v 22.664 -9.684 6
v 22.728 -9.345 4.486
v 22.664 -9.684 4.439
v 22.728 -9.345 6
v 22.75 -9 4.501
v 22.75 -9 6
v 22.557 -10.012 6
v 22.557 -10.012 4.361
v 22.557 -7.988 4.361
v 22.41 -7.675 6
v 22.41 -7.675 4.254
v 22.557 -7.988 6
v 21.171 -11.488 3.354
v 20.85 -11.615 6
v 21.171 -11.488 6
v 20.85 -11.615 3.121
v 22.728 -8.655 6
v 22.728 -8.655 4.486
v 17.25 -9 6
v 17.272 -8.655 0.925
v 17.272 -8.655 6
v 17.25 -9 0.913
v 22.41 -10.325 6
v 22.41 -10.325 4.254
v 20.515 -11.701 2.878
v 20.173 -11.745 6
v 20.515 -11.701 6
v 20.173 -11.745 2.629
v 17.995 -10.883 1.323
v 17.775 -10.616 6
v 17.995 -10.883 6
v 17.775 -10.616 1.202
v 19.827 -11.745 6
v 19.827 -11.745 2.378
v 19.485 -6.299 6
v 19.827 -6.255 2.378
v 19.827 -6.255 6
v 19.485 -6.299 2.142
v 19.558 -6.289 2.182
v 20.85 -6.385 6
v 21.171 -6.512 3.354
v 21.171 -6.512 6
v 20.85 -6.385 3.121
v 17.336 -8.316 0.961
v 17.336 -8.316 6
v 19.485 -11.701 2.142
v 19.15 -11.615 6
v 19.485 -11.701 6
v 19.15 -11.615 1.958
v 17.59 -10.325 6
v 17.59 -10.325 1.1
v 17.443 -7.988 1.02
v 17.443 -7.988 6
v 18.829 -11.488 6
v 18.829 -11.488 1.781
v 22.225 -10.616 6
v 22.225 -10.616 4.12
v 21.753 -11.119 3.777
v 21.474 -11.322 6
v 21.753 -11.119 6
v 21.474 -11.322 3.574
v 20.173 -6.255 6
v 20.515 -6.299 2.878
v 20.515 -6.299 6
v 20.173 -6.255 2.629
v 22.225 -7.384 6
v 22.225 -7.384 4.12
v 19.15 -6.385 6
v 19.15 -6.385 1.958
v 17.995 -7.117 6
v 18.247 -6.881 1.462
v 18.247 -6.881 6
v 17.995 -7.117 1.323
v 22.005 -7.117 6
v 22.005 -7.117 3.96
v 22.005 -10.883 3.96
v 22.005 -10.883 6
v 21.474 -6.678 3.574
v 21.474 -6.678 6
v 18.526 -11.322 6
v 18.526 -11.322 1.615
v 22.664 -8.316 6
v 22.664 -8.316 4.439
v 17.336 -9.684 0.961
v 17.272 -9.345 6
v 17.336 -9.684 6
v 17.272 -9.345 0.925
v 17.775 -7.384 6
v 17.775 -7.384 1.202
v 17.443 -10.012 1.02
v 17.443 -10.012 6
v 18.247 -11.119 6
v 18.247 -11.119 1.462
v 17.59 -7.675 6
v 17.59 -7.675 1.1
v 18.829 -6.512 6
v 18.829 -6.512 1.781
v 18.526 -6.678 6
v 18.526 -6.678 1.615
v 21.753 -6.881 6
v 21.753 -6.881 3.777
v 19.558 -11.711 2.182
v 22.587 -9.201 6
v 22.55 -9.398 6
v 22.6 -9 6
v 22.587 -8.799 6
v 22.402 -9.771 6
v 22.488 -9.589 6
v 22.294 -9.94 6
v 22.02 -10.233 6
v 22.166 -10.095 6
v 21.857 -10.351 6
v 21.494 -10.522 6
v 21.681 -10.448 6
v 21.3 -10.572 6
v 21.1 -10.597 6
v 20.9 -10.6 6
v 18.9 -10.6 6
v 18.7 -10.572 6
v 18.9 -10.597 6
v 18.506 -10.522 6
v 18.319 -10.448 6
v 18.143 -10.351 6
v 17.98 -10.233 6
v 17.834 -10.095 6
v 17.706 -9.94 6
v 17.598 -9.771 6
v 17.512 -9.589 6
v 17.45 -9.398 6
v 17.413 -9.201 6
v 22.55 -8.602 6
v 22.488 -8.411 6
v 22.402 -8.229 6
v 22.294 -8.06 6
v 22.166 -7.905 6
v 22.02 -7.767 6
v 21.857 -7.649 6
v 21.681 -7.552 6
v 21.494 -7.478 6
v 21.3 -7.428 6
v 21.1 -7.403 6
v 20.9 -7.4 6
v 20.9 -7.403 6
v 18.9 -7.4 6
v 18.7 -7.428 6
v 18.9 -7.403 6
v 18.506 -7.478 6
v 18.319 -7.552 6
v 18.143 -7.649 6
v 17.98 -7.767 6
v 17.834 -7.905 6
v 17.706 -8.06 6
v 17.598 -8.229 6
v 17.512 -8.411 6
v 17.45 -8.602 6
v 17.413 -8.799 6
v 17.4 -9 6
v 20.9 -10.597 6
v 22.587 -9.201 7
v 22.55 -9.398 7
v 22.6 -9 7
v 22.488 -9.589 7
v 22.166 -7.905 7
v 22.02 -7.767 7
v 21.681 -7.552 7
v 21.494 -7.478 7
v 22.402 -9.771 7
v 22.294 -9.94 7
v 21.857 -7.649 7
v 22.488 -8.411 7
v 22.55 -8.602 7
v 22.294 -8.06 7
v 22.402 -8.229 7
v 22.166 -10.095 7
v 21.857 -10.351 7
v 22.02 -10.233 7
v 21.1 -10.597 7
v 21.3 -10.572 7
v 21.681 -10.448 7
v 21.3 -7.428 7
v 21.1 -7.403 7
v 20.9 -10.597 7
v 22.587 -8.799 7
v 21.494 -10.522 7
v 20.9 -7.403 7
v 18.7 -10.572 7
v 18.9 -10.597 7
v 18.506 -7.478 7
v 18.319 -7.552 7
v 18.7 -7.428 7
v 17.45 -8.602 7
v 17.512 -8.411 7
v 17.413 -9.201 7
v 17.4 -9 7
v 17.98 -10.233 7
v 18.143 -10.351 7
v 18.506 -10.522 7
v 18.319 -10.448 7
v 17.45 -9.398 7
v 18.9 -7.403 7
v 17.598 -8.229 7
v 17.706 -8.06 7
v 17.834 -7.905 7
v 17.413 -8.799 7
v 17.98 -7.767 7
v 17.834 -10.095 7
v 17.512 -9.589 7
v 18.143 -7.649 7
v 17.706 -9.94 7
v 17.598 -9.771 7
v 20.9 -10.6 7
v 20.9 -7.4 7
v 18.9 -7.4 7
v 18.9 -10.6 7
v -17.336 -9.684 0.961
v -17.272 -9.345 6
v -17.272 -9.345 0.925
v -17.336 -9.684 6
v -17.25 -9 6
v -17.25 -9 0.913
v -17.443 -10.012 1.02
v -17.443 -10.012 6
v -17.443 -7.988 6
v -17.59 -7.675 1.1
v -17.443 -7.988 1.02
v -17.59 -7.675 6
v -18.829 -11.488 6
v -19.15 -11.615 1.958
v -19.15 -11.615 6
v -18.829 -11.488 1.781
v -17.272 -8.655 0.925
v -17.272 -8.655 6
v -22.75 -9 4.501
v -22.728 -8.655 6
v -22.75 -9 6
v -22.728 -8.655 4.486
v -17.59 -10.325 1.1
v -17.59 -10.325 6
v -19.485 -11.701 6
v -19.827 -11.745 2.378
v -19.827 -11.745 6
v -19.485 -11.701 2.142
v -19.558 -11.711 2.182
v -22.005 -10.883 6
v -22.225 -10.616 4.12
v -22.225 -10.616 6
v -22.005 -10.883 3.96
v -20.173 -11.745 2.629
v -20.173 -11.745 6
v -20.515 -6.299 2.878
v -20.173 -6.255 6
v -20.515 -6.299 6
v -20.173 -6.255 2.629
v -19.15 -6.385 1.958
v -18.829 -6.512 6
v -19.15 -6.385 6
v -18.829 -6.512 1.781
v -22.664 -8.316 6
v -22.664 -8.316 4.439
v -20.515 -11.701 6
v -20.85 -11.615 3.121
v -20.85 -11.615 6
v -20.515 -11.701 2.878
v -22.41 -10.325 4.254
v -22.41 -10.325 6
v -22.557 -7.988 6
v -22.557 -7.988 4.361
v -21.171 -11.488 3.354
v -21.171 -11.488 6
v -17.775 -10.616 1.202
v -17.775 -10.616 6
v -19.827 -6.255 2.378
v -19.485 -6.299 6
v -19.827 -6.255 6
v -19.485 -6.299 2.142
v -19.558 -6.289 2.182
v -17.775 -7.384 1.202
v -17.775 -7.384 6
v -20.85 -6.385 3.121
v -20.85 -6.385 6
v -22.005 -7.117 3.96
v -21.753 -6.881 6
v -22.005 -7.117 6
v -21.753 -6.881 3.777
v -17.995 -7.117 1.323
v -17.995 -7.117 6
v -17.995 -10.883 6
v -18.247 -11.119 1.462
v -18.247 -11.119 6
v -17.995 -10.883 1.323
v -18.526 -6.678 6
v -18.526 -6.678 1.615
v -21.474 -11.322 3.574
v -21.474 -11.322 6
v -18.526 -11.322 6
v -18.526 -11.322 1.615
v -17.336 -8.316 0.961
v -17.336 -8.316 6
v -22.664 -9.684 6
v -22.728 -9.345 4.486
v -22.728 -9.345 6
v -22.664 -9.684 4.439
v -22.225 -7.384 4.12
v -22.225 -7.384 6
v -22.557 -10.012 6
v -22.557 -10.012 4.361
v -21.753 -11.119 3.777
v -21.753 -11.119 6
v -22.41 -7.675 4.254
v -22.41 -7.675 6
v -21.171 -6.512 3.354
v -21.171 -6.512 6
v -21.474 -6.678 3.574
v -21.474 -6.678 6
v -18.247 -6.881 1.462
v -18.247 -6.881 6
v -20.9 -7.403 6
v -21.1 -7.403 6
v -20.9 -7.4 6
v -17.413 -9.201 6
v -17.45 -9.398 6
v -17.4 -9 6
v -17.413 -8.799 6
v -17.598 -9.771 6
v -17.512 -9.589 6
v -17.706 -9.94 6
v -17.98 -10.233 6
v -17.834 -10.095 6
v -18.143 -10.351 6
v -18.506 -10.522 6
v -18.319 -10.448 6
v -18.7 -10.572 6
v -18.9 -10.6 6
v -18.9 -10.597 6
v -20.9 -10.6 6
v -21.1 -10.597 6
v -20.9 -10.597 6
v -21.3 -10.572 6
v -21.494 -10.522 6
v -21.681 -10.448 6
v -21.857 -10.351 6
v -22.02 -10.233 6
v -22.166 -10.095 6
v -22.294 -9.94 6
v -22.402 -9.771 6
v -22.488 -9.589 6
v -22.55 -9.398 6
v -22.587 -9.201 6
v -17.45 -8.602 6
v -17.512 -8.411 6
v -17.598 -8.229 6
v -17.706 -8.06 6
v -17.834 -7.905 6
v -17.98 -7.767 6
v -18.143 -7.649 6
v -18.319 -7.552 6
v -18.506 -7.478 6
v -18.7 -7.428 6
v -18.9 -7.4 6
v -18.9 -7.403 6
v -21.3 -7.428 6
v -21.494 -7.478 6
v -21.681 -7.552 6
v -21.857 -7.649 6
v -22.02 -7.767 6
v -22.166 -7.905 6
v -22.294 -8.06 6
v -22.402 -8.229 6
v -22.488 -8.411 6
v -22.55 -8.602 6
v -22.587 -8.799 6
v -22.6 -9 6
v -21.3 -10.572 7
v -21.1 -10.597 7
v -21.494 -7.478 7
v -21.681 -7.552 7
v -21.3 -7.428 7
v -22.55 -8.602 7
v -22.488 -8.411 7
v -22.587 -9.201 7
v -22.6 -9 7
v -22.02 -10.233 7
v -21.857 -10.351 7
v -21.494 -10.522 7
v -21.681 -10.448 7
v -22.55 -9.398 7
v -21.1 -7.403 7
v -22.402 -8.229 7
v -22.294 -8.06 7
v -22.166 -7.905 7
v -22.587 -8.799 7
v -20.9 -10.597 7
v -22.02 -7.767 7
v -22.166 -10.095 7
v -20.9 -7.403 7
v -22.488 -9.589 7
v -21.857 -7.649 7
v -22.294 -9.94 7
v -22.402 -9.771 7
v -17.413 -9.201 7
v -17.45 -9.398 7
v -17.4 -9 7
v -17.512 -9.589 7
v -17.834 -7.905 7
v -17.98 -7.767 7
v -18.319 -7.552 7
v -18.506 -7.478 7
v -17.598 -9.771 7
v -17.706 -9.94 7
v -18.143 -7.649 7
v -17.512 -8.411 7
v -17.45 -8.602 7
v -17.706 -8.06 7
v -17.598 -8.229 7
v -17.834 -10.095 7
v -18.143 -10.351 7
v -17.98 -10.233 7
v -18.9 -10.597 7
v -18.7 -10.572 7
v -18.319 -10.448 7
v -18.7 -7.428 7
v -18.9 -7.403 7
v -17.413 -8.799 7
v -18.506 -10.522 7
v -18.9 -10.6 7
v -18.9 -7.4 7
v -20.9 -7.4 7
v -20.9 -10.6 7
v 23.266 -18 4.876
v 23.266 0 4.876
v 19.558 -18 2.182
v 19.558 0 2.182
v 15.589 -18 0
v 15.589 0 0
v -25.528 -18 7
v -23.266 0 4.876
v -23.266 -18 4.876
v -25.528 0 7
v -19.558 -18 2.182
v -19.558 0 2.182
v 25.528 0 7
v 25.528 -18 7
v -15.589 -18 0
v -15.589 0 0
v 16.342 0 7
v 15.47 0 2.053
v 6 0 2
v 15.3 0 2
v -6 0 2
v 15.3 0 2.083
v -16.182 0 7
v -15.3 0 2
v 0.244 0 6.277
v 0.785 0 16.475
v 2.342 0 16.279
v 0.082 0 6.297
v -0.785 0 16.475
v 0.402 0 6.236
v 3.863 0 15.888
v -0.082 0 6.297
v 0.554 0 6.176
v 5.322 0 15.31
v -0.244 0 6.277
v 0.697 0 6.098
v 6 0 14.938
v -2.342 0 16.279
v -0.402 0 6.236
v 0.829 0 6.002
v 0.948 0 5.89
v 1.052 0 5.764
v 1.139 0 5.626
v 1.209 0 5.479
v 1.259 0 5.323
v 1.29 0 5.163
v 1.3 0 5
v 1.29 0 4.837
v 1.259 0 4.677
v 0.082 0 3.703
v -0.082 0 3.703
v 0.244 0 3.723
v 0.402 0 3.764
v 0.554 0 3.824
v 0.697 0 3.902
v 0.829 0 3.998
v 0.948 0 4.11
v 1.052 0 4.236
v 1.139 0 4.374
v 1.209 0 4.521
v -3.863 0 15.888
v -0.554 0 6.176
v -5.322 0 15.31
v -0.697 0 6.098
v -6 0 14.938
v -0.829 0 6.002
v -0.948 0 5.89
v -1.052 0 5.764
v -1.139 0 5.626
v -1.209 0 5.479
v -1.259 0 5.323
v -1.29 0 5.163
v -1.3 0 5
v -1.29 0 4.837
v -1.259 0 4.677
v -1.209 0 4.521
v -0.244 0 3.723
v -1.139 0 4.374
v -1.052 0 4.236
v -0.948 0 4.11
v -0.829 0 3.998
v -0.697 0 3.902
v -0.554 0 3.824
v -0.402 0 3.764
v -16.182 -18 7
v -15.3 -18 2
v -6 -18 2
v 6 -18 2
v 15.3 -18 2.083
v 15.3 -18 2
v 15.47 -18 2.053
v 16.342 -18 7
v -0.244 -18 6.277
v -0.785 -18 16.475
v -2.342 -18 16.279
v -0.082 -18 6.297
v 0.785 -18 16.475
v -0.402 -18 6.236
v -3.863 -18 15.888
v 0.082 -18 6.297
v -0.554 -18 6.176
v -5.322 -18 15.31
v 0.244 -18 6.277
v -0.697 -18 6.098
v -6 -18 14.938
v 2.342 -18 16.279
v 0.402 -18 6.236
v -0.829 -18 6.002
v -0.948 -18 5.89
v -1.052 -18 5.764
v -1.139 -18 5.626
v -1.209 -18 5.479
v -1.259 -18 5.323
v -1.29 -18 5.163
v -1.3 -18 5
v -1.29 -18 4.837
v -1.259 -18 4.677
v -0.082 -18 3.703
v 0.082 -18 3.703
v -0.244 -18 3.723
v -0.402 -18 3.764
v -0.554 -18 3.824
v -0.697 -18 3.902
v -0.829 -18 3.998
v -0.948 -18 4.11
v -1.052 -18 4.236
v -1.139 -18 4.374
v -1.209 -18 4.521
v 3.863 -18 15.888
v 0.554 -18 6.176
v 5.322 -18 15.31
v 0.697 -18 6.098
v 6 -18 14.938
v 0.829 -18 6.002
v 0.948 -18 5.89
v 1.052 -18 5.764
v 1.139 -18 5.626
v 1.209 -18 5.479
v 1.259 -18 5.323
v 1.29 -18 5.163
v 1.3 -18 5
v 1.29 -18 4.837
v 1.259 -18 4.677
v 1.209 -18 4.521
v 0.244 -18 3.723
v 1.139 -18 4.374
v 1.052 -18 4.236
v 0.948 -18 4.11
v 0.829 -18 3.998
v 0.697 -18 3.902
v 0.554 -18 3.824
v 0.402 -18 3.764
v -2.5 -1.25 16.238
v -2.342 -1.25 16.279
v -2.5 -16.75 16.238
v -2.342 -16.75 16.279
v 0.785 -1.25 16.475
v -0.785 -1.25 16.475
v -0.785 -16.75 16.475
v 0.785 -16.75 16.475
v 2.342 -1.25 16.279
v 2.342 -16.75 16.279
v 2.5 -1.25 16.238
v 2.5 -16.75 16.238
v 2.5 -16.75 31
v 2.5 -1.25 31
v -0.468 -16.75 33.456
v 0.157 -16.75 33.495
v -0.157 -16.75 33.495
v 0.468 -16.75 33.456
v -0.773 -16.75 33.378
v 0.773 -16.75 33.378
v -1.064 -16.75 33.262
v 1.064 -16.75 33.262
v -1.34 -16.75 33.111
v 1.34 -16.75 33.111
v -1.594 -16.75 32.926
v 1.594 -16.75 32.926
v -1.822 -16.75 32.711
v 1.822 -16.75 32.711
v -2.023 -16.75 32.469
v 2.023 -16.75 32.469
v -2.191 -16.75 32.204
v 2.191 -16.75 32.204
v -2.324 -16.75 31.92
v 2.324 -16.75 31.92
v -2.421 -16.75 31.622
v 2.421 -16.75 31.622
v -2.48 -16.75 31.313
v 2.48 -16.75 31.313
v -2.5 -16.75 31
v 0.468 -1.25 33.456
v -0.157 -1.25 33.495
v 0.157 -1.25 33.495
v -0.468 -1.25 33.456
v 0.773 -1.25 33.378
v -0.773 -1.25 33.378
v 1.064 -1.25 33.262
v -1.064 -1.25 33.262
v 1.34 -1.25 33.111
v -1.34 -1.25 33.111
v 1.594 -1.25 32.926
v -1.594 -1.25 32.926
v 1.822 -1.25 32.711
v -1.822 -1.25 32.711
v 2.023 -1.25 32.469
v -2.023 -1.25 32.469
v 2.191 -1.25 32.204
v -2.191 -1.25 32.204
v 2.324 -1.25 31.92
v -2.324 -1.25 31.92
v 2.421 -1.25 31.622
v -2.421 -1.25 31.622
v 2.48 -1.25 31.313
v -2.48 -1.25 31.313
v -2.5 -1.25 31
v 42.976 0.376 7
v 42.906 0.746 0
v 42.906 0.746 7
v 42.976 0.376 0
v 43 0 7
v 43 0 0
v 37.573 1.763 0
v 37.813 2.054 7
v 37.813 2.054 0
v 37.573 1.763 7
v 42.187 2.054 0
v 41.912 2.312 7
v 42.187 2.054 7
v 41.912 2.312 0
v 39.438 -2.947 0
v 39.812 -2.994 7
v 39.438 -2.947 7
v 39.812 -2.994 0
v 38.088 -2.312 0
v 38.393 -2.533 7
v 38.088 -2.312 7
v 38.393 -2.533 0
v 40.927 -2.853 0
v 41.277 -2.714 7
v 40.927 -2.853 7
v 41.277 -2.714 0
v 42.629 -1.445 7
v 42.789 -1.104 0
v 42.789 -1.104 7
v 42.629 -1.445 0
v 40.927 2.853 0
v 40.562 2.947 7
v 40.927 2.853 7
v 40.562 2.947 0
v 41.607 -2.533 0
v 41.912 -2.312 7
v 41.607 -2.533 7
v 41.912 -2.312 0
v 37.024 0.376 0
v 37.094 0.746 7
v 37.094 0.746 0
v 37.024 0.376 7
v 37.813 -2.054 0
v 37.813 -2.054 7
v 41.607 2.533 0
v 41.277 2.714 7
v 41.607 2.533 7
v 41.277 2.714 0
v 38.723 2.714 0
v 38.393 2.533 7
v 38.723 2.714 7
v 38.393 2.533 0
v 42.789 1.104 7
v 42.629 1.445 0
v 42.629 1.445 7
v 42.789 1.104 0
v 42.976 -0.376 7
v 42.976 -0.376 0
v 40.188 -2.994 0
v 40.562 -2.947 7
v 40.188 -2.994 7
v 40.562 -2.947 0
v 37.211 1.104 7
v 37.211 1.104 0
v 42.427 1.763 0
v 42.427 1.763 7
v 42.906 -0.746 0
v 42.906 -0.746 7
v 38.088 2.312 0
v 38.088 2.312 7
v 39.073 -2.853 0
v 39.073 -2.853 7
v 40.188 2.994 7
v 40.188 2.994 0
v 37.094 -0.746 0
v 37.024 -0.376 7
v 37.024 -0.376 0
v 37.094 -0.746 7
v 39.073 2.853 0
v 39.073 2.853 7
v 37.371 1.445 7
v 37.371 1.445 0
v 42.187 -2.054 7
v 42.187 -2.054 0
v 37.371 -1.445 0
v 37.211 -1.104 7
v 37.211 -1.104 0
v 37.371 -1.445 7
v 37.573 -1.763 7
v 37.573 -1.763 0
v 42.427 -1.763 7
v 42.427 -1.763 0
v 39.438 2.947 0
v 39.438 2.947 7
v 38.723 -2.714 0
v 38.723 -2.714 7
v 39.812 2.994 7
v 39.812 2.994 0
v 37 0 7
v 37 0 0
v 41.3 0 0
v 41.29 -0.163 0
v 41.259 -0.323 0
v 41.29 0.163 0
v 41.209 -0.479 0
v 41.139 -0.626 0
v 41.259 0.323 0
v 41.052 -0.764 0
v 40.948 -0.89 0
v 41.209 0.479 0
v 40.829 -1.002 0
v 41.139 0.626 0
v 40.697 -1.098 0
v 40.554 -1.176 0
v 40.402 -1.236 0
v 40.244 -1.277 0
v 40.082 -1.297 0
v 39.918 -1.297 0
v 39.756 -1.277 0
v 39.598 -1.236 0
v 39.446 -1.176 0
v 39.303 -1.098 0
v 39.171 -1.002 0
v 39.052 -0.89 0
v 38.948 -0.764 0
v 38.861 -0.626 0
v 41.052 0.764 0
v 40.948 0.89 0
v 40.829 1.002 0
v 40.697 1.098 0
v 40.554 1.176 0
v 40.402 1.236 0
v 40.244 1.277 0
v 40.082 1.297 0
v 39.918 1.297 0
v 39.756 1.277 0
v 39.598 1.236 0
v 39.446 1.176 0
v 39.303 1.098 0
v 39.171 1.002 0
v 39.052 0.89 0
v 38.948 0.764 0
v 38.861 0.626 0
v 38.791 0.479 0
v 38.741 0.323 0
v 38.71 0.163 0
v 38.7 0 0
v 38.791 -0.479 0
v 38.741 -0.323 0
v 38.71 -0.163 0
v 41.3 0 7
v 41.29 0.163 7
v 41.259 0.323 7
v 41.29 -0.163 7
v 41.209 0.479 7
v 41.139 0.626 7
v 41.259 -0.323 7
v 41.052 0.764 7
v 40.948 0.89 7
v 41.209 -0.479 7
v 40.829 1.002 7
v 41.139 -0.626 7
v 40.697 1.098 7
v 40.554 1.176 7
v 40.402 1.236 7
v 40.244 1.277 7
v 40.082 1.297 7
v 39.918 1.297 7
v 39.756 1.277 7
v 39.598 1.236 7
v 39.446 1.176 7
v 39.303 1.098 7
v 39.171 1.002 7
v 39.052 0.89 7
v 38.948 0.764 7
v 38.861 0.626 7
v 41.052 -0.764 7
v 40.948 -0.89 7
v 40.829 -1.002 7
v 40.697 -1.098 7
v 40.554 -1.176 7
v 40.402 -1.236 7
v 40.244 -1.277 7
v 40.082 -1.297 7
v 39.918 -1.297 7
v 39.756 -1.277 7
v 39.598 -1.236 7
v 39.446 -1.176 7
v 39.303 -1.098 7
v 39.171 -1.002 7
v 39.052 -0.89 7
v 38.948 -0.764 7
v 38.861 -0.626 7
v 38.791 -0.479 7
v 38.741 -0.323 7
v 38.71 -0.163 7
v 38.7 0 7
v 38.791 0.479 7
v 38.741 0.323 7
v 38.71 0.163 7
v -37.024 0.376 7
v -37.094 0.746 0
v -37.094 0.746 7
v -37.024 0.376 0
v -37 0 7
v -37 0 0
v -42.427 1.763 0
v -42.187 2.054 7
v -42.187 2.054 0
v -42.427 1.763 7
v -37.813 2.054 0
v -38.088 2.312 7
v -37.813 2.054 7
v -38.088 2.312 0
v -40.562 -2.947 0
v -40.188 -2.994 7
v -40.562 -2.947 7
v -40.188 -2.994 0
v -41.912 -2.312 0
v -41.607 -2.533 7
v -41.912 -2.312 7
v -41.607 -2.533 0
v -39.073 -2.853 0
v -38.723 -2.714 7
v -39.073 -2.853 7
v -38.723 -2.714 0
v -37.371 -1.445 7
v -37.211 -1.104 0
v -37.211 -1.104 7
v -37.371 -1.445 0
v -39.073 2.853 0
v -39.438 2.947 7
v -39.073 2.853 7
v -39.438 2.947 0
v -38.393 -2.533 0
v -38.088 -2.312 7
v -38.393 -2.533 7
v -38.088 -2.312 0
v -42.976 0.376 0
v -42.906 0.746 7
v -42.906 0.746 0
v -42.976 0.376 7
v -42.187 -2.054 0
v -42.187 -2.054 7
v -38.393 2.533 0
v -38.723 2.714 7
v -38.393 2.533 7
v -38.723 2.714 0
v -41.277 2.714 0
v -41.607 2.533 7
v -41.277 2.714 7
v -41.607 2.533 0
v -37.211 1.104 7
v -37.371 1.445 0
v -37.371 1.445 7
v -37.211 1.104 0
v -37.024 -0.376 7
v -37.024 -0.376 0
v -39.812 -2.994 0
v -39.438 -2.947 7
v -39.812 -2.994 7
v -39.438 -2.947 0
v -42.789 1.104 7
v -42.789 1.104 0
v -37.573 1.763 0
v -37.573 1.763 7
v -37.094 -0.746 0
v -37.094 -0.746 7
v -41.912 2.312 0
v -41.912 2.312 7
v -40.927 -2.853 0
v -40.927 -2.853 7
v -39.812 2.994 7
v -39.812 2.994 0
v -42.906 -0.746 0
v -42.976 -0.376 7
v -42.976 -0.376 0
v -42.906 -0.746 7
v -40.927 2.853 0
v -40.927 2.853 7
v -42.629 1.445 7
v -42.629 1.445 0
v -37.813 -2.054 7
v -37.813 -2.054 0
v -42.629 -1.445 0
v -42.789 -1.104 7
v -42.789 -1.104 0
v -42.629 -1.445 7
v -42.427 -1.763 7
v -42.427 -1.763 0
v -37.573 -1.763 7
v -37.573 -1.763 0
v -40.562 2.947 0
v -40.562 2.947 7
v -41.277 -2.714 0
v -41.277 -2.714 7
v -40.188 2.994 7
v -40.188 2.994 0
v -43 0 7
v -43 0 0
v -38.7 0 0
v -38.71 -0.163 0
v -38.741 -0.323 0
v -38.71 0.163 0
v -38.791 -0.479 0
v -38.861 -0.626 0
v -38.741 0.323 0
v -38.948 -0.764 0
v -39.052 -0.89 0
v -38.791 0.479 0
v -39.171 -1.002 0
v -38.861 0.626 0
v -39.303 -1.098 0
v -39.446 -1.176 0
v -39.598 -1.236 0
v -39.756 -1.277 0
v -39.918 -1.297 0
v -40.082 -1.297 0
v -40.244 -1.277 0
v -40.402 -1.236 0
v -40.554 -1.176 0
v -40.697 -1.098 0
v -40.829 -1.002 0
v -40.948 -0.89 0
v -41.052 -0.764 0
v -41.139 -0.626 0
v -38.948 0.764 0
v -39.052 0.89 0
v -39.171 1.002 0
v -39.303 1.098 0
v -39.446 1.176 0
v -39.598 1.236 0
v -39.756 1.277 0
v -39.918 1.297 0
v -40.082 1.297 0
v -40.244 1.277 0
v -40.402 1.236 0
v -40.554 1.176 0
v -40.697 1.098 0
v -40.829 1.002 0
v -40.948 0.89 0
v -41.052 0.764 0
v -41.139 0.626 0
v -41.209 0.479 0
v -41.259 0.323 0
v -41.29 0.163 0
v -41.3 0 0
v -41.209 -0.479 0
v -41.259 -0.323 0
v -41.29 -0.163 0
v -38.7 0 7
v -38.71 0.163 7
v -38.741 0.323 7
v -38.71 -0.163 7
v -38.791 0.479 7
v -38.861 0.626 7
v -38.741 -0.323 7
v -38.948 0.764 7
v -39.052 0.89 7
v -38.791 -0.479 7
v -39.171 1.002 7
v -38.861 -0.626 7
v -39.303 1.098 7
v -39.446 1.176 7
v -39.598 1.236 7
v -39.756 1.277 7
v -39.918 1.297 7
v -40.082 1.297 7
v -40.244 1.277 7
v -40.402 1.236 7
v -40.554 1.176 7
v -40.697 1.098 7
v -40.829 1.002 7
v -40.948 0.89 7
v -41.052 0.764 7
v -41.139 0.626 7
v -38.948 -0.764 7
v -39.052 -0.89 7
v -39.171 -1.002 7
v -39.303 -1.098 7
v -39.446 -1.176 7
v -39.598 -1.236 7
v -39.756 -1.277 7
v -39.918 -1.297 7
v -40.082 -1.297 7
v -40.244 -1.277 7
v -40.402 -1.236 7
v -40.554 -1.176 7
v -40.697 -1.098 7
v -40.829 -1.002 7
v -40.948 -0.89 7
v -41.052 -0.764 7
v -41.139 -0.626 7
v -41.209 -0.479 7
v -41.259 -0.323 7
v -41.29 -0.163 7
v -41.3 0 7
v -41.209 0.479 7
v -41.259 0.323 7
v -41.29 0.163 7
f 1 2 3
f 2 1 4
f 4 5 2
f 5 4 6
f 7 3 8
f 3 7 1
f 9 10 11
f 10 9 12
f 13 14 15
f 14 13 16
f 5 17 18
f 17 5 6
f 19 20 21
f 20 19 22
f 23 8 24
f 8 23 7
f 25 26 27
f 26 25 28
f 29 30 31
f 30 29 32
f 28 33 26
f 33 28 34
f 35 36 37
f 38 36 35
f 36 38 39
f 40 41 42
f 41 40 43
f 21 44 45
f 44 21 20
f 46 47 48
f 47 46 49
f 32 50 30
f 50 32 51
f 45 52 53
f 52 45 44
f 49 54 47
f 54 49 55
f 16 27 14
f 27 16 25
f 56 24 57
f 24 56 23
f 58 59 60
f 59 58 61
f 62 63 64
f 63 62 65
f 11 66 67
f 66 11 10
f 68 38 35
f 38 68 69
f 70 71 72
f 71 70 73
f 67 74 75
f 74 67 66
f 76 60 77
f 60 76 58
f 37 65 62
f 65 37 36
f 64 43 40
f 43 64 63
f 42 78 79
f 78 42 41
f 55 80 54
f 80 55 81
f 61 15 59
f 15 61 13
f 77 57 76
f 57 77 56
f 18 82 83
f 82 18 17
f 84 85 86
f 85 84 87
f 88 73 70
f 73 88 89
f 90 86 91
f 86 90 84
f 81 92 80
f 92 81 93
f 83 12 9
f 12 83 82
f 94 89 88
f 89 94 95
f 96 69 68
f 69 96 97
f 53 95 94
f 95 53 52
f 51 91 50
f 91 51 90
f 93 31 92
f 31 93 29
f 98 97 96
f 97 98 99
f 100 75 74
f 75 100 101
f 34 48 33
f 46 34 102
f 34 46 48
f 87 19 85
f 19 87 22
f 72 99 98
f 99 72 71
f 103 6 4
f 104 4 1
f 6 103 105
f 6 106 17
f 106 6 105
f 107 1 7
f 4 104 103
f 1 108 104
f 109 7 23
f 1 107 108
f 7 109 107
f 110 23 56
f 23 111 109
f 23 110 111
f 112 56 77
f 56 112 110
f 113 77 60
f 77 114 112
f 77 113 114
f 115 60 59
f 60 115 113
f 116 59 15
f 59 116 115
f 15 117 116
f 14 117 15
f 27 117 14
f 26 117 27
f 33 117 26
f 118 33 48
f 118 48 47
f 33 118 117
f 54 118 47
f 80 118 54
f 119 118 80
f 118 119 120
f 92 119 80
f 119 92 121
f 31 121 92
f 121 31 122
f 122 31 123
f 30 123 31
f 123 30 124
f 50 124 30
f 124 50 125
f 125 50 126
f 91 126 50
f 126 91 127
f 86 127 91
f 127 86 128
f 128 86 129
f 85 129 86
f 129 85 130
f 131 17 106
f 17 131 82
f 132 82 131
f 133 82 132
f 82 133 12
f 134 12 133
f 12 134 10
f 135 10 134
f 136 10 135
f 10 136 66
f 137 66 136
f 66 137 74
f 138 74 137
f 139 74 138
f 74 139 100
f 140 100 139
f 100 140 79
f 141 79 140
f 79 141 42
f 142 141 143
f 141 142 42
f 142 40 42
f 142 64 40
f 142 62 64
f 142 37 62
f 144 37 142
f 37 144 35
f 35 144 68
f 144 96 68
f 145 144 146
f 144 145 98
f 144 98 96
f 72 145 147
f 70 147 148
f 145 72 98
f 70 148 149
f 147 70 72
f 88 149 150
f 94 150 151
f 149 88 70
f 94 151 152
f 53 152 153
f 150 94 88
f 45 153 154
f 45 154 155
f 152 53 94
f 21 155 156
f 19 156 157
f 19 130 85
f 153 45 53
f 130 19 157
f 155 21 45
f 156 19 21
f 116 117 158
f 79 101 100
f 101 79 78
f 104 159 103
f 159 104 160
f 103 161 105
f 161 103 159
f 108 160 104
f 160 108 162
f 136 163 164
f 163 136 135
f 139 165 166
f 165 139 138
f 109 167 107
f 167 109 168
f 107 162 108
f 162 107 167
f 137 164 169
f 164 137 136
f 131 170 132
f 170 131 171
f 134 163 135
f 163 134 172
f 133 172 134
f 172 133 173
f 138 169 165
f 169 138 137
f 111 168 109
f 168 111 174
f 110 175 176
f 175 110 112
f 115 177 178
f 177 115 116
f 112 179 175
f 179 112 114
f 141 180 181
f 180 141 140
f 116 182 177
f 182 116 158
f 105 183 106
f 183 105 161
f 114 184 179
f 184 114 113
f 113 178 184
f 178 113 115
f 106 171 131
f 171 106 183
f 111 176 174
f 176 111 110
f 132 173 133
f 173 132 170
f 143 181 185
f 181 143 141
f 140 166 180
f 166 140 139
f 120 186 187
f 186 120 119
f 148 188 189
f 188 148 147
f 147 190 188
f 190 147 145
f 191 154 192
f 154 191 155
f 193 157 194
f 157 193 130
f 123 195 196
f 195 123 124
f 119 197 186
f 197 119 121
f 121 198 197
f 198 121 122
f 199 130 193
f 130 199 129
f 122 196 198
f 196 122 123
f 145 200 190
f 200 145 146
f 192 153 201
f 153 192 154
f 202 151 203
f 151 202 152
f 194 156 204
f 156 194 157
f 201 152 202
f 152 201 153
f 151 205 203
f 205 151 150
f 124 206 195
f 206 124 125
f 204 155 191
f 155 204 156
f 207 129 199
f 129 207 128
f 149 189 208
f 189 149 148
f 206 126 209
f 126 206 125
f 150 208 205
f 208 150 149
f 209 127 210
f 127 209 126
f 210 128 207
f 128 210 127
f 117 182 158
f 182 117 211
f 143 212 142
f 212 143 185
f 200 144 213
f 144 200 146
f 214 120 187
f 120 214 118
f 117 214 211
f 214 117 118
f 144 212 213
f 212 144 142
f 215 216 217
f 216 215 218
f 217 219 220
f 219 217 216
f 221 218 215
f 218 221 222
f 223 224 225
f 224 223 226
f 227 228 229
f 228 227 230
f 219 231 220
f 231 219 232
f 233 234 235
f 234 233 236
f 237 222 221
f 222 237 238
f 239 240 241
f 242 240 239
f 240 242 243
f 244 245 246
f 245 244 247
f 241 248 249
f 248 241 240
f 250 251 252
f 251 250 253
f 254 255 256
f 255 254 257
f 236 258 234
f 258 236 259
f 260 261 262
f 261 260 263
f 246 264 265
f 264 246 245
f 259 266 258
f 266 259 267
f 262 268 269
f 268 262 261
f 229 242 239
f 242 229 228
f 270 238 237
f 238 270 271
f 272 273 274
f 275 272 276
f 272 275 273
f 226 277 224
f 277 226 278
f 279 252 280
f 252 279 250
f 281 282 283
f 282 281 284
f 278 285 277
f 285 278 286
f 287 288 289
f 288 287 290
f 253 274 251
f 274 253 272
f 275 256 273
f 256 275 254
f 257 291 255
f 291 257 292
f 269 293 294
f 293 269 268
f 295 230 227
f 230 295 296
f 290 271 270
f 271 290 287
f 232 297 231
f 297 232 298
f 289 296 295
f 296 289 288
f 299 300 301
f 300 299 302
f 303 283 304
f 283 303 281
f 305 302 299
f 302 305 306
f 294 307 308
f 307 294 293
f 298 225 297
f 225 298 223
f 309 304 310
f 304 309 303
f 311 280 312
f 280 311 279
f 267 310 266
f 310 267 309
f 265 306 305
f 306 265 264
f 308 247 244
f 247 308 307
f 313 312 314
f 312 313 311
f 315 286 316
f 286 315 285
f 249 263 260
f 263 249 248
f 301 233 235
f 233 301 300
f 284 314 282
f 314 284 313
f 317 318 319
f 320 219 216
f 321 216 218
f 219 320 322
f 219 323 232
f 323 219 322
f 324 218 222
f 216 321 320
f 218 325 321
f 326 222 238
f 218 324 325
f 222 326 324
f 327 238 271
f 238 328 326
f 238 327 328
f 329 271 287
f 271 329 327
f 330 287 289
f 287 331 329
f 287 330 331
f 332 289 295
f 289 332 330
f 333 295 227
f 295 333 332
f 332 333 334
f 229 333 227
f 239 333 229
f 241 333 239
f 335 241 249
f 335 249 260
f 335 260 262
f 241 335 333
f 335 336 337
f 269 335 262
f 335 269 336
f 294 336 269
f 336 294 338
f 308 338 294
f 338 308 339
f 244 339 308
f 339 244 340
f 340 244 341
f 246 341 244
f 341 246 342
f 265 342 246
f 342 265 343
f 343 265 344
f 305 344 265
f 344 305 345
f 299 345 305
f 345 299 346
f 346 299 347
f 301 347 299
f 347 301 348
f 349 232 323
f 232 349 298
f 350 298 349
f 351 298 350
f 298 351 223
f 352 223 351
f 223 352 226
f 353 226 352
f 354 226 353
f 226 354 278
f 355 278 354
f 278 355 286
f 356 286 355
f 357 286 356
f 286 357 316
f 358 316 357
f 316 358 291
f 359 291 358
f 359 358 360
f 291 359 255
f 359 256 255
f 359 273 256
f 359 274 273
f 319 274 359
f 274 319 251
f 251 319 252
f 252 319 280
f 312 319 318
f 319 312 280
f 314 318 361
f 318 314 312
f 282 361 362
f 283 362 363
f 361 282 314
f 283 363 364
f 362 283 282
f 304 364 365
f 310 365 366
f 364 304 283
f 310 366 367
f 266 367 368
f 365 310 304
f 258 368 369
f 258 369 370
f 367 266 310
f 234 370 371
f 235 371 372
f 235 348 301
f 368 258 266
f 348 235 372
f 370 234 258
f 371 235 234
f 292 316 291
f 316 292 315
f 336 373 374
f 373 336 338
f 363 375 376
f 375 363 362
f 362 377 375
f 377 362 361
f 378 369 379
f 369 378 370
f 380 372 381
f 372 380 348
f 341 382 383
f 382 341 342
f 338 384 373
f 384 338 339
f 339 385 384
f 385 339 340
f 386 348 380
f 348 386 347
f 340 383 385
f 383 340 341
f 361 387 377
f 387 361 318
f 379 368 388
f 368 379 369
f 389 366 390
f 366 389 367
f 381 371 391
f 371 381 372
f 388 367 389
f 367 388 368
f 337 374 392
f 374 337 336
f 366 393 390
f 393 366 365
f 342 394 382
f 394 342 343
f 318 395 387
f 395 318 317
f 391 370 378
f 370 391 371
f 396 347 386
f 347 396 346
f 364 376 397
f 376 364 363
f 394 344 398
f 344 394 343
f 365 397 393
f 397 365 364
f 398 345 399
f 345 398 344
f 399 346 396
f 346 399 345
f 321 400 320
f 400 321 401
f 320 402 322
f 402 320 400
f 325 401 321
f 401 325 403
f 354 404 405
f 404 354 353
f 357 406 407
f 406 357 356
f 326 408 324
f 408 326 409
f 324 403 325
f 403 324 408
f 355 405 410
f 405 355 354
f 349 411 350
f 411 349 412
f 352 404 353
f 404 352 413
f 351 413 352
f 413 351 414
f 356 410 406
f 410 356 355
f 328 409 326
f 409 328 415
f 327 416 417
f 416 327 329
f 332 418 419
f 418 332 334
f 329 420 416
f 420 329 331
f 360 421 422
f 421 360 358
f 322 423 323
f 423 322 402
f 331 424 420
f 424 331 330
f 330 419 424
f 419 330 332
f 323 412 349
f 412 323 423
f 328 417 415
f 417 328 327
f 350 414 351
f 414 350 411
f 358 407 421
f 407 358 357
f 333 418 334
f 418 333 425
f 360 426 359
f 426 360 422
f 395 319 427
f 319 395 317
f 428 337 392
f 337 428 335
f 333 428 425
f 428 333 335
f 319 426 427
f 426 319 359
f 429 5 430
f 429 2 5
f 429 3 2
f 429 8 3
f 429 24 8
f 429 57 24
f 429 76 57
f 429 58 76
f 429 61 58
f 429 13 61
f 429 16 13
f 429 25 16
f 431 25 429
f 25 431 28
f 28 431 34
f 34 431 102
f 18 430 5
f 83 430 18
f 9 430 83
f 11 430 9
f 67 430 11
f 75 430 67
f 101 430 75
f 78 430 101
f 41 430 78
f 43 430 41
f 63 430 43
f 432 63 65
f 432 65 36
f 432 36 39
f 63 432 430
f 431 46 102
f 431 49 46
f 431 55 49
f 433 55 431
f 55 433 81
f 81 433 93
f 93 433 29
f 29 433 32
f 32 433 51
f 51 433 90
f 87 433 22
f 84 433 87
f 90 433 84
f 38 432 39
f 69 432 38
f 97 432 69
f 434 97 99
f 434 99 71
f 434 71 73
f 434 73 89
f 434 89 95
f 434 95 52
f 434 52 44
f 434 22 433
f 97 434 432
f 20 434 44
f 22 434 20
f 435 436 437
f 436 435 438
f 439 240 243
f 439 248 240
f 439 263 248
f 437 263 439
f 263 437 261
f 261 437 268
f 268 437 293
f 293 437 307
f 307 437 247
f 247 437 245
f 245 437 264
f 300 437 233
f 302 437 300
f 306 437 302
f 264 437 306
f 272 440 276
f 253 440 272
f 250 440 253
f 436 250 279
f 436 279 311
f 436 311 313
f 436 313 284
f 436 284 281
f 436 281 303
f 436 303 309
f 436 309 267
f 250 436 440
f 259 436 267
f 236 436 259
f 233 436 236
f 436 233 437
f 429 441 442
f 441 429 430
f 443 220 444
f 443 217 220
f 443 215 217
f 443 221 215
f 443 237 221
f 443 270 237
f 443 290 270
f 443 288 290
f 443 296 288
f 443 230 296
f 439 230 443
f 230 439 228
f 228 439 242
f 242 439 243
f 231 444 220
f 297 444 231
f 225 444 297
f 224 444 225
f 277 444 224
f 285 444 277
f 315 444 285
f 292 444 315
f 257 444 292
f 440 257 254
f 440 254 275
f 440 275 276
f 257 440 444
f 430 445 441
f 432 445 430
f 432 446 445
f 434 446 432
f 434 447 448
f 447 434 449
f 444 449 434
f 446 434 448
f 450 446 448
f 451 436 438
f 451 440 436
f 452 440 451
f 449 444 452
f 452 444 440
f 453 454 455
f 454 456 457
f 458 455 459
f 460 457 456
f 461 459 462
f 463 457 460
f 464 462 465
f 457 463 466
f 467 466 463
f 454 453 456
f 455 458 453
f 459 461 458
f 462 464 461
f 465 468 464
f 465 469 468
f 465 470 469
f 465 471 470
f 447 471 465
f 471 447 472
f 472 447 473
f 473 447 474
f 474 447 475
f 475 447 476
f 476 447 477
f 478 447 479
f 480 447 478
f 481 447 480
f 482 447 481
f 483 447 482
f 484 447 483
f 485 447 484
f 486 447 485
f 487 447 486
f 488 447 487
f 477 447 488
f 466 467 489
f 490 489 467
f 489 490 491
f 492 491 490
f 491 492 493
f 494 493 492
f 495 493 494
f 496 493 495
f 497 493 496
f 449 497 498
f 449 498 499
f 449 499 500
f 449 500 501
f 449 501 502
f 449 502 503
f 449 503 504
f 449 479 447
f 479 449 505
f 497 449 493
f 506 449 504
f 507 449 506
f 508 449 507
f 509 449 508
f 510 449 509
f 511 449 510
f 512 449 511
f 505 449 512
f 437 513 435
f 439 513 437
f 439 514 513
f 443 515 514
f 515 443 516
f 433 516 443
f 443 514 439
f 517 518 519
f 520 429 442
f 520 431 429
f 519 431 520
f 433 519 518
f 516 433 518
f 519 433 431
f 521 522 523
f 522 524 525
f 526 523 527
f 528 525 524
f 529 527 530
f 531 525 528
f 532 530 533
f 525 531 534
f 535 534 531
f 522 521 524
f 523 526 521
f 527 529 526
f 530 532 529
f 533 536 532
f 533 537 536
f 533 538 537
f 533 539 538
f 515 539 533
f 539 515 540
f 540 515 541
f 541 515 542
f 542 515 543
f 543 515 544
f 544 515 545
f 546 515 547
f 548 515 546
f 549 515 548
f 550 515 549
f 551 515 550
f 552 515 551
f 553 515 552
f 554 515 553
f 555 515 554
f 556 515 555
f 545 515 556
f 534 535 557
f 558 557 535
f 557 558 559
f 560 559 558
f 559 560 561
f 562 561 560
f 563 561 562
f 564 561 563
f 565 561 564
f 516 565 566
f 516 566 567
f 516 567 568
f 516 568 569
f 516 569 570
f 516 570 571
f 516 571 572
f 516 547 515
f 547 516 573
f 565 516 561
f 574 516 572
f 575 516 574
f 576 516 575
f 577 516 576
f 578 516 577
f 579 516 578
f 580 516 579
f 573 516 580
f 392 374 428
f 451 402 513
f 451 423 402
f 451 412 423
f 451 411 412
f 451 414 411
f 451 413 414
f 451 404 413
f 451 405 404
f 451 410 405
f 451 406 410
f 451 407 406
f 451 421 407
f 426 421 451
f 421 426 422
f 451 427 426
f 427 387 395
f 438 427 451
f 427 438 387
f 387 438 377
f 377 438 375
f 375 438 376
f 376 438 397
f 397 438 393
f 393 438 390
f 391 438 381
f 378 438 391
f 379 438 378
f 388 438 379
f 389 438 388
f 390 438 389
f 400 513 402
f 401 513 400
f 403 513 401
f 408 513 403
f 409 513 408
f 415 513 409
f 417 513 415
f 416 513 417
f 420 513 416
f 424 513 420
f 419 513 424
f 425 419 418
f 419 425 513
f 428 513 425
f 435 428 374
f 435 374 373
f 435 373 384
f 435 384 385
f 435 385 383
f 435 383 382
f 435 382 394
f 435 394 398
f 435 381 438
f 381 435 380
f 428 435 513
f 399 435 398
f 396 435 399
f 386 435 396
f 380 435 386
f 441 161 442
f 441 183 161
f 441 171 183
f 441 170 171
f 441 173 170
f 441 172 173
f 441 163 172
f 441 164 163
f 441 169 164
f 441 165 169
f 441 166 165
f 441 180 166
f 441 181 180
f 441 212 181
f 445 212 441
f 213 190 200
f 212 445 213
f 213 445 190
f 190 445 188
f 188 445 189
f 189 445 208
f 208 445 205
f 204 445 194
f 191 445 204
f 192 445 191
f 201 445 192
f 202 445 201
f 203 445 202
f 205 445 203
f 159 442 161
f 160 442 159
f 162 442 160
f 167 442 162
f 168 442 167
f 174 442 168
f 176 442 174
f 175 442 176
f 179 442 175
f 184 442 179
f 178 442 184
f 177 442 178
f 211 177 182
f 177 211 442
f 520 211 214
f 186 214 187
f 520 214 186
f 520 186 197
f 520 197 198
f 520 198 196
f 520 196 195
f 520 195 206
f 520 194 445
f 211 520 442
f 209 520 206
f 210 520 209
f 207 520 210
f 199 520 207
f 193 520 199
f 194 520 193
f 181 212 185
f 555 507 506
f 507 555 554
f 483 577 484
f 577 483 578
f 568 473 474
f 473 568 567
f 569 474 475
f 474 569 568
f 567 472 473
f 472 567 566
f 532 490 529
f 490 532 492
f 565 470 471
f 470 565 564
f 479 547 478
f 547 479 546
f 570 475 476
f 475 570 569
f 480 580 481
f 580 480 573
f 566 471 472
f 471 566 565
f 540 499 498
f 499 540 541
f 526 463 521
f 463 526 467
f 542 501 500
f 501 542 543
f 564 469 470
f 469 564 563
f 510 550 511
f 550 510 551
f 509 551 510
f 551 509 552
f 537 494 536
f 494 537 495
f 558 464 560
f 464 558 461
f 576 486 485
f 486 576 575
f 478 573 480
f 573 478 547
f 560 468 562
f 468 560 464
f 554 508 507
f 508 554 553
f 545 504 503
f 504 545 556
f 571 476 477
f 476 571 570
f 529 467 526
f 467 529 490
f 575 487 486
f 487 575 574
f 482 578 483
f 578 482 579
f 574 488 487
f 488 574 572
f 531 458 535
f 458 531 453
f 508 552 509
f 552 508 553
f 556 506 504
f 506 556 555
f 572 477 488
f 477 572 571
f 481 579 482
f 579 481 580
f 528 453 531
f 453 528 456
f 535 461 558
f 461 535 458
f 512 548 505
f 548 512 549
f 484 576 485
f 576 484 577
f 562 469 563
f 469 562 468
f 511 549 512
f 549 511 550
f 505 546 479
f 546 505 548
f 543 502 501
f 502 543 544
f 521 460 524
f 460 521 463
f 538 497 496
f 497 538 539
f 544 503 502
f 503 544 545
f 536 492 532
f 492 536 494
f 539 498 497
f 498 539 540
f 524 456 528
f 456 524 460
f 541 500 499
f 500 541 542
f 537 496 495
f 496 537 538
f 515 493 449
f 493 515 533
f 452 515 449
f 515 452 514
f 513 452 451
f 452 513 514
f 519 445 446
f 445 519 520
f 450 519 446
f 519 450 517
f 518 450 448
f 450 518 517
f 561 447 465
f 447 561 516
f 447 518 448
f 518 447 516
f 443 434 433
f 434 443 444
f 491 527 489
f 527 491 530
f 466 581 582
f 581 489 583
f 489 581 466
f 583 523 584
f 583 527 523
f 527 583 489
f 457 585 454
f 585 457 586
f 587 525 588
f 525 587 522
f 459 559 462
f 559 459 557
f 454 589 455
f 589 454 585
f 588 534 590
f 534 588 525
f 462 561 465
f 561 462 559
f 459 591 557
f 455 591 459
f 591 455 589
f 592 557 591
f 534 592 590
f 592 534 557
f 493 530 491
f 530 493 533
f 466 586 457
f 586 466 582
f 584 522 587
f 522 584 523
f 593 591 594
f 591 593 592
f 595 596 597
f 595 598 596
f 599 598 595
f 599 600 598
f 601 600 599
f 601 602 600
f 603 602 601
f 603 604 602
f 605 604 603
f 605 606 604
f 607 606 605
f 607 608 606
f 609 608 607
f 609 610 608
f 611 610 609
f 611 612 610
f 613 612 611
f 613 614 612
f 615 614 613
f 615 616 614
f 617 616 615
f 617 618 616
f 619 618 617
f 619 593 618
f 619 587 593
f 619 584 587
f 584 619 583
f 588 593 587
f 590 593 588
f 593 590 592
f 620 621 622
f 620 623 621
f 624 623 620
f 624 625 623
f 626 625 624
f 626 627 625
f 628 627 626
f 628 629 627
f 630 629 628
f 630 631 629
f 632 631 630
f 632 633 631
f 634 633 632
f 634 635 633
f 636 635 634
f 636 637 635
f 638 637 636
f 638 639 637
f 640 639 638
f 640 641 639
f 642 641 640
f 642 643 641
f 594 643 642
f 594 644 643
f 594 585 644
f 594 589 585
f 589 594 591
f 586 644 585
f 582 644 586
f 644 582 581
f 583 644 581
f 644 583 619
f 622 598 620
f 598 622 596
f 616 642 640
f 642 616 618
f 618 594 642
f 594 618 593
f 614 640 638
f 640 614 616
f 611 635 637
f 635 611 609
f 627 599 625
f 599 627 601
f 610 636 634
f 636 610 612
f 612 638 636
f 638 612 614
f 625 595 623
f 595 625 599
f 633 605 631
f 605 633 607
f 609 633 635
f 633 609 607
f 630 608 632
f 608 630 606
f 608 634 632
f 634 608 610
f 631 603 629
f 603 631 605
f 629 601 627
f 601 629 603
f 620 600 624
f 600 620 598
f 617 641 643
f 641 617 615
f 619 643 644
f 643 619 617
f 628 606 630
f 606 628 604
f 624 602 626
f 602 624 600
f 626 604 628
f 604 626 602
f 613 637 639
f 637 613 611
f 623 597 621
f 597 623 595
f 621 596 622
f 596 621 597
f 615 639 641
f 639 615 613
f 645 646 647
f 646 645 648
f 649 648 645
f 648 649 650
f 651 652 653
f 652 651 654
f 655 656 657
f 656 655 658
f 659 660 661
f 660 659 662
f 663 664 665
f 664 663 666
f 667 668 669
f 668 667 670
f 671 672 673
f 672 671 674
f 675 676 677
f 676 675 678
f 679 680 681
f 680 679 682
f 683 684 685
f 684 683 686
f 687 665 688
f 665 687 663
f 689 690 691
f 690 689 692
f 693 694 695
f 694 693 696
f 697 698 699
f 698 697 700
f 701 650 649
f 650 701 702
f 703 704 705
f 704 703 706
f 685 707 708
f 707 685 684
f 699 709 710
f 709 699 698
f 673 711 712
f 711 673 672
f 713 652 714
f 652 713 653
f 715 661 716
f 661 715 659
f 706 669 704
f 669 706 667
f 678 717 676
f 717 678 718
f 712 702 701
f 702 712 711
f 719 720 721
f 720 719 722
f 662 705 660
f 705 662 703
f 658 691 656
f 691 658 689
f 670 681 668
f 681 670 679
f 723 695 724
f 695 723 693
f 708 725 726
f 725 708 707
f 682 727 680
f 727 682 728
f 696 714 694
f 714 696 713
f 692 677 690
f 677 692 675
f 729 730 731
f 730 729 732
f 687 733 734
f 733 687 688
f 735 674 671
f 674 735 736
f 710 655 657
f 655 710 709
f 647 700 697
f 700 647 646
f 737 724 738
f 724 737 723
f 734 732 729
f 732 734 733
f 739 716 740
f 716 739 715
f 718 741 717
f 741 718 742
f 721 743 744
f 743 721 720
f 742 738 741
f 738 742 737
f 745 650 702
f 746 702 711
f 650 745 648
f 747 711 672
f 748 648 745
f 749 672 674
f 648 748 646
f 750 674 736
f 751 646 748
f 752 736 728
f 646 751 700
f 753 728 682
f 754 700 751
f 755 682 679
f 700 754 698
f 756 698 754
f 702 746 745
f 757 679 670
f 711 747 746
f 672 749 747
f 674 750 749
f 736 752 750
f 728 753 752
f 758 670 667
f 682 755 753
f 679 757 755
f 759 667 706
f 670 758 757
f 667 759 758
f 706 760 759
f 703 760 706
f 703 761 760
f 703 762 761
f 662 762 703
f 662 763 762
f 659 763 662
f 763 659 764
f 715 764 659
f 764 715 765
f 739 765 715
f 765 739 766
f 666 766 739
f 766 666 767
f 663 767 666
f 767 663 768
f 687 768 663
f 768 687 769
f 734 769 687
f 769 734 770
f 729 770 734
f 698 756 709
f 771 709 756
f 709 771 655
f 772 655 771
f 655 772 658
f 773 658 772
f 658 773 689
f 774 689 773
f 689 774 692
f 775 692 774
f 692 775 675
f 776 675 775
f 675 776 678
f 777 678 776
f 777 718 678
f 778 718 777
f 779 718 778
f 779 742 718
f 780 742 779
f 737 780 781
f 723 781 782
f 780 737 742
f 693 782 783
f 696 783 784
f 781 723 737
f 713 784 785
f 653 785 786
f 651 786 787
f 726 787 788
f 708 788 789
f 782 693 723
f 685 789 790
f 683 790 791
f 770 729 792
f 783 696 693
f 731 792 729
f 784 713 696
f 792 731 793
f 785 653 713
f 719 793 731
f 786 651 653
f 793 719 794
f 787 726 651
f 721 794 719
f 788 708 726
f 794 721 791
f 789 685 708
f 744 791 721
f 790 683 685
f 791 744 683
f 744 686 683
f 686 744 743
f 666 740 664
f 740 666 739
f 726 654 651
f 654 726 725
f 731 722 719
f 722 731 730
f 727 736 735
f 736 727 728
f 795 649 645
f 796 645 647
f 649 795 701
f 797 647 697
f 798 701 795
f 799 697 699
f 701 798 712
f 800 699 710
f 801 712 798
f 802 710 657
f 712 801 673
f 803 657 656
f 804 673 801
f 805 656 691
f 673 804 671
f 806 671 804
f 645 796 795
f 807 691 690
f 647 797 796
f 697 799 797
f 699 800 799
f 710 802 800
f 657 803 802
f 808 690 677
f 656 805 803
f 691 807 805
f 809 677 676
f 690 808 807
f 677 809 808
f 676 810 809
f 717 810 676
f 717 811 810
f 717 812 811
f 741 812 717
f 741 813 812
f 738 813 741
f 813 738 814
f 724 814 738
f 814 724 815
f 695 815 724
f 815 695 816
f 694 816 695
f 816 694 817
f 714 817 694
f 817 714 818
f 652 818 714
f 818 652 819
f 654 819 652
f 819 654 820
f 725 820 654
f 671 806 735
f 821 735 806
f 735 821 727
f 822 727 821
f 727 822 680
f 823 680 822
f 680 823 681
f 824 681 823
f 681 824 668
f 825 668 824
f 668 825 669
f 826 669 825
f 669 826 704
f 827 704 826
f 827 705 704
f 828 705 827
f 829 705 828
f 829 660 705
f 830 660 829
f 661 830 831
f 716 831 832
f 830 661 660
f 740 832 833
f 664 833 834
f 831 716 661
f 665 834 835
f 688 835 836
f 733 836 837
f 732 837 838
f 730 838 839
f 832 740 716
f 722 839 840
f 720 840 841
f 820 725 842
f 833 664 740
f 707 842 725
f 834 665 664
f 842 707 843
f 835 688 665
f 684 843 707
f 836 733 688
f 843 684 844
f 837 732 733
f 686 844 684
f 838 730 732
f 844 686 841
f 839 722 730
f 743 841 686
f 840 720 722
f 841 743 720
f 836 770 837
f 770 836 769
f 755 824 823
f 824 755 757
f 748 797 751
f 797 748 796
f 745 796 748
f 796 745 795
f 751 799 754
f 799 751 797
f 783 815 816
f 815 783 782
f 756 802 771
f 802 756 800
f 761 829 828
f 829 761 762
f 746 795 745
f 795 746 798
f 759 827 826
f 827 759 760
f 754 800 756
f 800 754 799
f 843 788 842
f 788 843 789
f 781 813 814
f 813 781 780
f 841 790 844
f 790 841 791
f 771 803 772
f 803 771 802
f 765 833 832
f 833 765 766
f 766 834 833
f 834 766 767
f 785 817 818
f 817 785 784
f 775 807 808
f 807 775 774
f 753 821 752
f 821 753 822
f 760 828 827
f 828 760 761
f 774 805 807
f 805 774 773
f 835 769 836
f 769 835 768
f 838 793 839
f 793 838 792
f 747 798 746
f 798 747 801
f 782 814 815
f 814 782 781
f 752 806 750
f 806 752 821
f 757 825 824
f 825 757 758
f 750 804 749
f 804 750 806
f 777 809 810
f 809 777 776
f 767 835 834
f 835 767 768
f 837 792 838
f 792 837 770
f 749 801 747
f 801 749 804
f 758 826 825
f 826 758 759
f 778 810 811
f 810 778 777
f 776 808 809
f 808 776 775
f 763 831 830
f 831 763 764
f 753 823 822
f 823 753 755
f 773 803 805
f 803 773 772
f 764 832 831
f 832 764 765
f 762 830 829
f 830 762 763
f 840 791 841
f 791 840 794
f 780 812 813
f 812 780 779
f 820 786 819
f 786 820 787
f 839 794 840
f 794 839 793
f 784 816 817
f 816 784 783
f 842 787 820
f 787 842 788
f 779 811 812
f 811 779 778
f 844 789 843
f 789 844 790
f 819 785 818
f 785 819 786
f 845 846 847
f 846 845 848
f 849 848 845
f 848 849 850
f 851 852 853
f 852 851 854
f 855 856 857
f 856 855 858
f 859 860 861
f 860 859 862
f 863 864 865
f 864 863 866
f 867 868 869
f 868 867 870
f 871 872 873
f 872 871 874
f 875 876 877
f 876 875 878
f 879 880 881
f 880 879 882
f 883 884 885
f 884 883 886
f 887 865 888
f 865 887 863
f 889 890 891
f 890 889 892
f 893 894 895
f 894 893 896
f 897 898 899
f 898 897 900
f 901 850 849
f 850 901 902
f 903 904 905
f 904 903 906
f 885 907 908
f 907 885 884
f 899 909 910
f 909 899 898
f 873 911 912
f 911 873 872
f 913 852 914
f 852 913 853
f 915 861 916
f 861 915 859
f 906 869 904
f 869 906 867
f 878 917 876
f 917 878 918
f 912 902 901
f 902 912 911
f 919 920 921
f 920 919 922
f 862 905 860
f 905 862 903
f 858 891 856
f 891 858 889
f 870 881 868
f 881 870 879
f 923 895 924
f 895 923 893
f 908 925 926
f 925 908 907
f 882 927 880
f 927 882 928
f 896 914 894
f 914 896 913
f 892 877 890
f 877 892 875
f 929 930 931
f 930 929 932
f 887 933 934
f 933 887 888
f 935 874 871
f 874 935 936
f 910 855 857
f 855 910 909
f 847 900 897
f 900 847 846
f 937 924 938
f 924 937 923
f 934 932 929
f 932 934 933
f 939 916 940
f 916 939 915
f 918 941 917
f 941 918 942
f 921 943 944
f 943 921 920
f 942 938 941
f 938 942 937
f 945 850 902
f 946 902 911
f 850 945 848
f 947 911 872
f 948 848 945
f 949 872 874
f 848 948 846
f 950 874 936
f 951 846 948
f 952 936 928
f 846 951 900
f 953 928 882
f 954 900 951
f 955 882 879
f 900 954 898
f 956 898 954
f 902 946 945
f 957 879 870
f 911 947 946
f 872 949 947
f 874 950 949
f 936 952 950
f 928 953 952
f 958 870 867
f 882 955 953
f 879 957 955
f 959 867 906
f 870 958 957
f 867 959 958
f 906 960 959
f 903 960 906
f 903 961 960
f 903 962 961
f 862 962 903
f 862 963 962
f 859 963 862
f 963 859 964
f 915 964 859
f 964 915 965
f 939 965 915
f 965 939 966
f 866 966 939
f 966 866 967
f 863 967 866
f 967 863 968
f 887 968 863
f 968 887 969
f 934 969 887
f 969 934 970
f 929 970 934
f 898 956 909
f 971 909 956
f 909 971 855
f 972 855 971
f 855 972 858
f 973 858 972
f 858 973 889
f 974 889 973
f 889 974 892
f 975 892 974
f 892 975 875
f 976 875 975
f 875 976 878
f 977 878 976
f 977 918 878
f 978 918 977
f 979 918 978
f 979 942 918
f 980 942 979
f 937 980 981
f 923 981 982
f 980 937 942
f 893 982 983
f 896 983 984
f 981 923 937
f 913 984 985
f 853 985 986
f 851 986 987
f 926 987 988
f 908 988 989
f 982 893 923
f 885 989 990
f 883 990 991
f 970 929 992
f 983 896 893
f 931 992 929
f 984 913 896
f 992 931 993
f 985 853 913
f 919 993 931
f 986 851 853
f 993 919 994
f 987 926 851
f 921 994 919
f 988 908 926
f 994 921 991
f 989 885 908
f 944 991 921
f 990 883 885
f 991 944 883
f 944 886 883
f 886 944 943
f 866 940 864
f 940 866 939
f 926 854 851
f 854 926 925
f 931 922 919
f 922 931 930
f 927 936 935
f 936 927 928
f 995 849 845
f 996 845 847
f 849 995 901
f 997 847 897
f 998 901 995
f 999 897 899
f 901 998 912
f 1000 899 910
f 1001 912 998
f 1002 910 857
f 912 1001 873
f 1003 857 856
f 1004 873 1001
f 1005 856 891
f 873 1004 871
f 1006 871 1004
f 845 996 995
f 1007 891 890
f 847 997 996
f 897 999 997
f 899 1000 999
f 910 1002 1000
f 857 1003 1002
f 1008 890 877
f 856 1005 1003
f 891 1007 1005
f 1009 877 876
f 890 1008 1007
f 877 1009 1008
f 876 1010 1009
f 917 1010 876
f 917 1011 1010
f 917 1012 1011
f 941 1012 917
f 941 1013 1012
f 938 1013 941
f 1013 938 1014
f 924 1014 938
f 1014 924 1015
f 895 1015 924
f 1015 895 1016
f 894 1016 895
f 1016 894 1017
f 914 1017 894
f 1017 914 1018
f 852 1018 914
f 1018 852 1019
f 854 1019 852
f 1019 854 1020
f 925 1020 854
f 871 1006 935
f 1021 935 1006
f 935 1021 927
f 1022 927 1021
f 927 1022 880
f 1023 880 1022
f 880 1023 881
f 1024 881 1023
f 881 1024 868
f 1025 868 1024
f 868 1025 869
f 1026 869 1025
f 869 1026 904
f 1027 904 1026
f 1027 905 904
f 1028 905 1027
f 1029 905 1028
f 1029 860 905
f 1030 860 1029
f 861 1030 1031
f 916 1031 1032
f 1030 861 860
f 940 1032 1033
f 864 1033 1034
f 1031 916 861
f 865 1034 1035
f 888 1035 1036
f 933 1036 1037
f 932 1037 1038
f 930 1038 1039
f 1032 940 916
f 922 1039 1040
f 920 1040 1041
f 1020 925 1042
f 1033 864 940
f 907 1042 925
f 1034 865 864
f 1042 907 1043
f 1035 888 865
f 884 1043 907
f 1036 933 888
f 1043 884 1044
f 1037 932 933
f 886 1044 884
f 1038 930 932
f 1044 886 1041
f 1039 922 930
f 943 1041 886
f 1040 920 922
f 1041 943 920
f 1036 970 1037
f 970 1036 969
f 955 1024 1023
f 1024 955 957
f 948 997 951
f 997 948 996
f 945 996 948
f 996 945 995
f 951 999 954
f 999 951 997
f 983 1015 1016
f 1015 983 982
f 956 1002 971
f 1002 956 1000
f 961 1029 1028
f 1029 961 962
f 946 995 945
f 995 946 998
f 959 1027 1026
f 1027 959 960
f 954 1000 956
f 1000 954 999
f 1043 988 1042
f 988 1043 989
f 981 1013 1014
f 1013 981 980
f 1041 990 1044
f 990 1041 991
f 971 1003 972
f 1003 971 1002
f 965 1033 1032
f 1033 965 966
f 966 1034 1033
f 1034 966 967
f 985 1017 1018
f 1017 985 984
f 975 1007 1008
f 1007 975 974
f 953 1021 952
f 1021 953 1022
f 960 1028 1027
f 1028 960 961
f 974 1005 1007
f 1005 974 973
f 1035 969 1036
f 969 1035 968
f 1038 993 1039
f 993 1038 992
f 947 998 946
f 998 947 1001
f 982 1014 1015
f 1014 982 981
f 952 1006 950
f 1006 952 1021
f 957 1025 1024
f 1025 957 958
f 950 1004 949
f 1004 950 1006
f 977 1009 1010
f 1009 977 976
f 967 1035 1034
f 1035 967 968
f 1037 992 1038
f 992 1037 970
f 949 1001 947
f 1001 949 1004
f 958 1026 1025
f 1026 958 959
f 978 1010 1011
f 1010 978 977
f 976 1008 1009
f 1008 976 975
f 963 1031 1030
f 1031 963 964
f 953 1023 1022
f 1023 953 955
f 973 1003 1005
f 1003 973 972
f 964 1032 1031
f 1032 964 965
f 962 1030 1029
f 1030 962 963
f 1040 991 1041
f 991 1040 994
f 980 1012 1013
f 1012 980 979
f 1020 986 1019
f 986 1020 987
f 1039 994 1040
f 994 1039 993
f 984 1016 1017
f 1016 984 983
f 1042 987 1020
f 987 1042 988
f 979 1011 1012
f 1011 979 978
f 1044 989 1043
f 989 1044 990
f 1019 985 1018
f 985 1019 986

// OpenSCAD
$fn = 50;

module rocker() {
    difference() {
        cylinder(h = 18, r = 36.5);
        // Top it off
        translate([-28, -26, -1])
            cube([80,100,21]);
        // Trim left and right
        translate([26,-50,-1])
            cube([30, 100, 21]);
        translate([-56,-50,-1])
            cube([30, 100, 21]);
        // Axle hole
        translate([0, -28, -1])
            cylinder(h = 20, r = 1.3);
        // Recess for switches
        translate([-15.3,-31,-1])
            cube([9.3, 15, 21]);
        translate([-15.3,-31,-1])
            rotate([0,0,10])
                cube([2,10,21]);
        translate([13.5,-30.6,-1])
            rotate([0,0,-10])
                cube([2,10,21]);
        translate([6,-31,-1])
            cube([9.3, 15, 21]);
        // Spring and pin holes
        rotate([90, 0, 0]) {
            translate([20, 9, 25]) {
                translate([0, 0, 2])
                    cylinder(h = 10, r = 2.75);
                translate([1, 0, -10])
                    cylinder(h = 50, r = 1.6);
                translate([-1, 0, -10])
                    cylinder(h = 50, r = 1.6);
                translate([-1.1, -1.6, -10])
                    cube([2,3.2,50]);
            }
            translate([-20, 9, 25]) {
                translate([0, 0, 2])
                    cylinder(h = 10, r = 2.75);
                translate([-1, 0, -10])
                    cylinder(h = 50, r = 1.6);
                translate([1, 0, -10])
                    cylinder(h = 50, r = 1.6);
                translate([-0.9, -1.6, -10])
                    cube([2,3.2,50]);
            }
        }
        // Flatten bottom
        translate([-16,-43,-1])
            cube([32,10,20]);
    }
}

module handleBase() {
    difference() {
        cylinder(h = 18, r = 12.5);
        translate([-15, -37.5, -1])
            cube(40);
        translate([6, 0, -1])
            cube(20);
        translate([-26, 0, -1])
            cube(20);
    }
}

module upperHandle() {
    cube([5,17,15.5]);
    translate([2.5,17,0]){
        cylinder(h = 15.5, r = 2.5);
    }
}

translate([0,0,4]) 
    rotate([90,0,0]) {
        union() {
            translate([0,29,0])
                rocker();
            handleBase();
            translate([-2.5,10,1.25])
                upperHandle();
        }
    }


// Washers
translate([40, 0, 0])
    difference() {
        cylinder(h = 7, r = 3);
        translate([0,0,-1])
            cylinder(h = 9, r = 1.3);
    }

translate([-40, 0, 0])
    difference() {
        cylinder(h = 7, r = 3);
        translate([0,0,-1])
            cylinder(h = 9, r = 1.3);
    }
